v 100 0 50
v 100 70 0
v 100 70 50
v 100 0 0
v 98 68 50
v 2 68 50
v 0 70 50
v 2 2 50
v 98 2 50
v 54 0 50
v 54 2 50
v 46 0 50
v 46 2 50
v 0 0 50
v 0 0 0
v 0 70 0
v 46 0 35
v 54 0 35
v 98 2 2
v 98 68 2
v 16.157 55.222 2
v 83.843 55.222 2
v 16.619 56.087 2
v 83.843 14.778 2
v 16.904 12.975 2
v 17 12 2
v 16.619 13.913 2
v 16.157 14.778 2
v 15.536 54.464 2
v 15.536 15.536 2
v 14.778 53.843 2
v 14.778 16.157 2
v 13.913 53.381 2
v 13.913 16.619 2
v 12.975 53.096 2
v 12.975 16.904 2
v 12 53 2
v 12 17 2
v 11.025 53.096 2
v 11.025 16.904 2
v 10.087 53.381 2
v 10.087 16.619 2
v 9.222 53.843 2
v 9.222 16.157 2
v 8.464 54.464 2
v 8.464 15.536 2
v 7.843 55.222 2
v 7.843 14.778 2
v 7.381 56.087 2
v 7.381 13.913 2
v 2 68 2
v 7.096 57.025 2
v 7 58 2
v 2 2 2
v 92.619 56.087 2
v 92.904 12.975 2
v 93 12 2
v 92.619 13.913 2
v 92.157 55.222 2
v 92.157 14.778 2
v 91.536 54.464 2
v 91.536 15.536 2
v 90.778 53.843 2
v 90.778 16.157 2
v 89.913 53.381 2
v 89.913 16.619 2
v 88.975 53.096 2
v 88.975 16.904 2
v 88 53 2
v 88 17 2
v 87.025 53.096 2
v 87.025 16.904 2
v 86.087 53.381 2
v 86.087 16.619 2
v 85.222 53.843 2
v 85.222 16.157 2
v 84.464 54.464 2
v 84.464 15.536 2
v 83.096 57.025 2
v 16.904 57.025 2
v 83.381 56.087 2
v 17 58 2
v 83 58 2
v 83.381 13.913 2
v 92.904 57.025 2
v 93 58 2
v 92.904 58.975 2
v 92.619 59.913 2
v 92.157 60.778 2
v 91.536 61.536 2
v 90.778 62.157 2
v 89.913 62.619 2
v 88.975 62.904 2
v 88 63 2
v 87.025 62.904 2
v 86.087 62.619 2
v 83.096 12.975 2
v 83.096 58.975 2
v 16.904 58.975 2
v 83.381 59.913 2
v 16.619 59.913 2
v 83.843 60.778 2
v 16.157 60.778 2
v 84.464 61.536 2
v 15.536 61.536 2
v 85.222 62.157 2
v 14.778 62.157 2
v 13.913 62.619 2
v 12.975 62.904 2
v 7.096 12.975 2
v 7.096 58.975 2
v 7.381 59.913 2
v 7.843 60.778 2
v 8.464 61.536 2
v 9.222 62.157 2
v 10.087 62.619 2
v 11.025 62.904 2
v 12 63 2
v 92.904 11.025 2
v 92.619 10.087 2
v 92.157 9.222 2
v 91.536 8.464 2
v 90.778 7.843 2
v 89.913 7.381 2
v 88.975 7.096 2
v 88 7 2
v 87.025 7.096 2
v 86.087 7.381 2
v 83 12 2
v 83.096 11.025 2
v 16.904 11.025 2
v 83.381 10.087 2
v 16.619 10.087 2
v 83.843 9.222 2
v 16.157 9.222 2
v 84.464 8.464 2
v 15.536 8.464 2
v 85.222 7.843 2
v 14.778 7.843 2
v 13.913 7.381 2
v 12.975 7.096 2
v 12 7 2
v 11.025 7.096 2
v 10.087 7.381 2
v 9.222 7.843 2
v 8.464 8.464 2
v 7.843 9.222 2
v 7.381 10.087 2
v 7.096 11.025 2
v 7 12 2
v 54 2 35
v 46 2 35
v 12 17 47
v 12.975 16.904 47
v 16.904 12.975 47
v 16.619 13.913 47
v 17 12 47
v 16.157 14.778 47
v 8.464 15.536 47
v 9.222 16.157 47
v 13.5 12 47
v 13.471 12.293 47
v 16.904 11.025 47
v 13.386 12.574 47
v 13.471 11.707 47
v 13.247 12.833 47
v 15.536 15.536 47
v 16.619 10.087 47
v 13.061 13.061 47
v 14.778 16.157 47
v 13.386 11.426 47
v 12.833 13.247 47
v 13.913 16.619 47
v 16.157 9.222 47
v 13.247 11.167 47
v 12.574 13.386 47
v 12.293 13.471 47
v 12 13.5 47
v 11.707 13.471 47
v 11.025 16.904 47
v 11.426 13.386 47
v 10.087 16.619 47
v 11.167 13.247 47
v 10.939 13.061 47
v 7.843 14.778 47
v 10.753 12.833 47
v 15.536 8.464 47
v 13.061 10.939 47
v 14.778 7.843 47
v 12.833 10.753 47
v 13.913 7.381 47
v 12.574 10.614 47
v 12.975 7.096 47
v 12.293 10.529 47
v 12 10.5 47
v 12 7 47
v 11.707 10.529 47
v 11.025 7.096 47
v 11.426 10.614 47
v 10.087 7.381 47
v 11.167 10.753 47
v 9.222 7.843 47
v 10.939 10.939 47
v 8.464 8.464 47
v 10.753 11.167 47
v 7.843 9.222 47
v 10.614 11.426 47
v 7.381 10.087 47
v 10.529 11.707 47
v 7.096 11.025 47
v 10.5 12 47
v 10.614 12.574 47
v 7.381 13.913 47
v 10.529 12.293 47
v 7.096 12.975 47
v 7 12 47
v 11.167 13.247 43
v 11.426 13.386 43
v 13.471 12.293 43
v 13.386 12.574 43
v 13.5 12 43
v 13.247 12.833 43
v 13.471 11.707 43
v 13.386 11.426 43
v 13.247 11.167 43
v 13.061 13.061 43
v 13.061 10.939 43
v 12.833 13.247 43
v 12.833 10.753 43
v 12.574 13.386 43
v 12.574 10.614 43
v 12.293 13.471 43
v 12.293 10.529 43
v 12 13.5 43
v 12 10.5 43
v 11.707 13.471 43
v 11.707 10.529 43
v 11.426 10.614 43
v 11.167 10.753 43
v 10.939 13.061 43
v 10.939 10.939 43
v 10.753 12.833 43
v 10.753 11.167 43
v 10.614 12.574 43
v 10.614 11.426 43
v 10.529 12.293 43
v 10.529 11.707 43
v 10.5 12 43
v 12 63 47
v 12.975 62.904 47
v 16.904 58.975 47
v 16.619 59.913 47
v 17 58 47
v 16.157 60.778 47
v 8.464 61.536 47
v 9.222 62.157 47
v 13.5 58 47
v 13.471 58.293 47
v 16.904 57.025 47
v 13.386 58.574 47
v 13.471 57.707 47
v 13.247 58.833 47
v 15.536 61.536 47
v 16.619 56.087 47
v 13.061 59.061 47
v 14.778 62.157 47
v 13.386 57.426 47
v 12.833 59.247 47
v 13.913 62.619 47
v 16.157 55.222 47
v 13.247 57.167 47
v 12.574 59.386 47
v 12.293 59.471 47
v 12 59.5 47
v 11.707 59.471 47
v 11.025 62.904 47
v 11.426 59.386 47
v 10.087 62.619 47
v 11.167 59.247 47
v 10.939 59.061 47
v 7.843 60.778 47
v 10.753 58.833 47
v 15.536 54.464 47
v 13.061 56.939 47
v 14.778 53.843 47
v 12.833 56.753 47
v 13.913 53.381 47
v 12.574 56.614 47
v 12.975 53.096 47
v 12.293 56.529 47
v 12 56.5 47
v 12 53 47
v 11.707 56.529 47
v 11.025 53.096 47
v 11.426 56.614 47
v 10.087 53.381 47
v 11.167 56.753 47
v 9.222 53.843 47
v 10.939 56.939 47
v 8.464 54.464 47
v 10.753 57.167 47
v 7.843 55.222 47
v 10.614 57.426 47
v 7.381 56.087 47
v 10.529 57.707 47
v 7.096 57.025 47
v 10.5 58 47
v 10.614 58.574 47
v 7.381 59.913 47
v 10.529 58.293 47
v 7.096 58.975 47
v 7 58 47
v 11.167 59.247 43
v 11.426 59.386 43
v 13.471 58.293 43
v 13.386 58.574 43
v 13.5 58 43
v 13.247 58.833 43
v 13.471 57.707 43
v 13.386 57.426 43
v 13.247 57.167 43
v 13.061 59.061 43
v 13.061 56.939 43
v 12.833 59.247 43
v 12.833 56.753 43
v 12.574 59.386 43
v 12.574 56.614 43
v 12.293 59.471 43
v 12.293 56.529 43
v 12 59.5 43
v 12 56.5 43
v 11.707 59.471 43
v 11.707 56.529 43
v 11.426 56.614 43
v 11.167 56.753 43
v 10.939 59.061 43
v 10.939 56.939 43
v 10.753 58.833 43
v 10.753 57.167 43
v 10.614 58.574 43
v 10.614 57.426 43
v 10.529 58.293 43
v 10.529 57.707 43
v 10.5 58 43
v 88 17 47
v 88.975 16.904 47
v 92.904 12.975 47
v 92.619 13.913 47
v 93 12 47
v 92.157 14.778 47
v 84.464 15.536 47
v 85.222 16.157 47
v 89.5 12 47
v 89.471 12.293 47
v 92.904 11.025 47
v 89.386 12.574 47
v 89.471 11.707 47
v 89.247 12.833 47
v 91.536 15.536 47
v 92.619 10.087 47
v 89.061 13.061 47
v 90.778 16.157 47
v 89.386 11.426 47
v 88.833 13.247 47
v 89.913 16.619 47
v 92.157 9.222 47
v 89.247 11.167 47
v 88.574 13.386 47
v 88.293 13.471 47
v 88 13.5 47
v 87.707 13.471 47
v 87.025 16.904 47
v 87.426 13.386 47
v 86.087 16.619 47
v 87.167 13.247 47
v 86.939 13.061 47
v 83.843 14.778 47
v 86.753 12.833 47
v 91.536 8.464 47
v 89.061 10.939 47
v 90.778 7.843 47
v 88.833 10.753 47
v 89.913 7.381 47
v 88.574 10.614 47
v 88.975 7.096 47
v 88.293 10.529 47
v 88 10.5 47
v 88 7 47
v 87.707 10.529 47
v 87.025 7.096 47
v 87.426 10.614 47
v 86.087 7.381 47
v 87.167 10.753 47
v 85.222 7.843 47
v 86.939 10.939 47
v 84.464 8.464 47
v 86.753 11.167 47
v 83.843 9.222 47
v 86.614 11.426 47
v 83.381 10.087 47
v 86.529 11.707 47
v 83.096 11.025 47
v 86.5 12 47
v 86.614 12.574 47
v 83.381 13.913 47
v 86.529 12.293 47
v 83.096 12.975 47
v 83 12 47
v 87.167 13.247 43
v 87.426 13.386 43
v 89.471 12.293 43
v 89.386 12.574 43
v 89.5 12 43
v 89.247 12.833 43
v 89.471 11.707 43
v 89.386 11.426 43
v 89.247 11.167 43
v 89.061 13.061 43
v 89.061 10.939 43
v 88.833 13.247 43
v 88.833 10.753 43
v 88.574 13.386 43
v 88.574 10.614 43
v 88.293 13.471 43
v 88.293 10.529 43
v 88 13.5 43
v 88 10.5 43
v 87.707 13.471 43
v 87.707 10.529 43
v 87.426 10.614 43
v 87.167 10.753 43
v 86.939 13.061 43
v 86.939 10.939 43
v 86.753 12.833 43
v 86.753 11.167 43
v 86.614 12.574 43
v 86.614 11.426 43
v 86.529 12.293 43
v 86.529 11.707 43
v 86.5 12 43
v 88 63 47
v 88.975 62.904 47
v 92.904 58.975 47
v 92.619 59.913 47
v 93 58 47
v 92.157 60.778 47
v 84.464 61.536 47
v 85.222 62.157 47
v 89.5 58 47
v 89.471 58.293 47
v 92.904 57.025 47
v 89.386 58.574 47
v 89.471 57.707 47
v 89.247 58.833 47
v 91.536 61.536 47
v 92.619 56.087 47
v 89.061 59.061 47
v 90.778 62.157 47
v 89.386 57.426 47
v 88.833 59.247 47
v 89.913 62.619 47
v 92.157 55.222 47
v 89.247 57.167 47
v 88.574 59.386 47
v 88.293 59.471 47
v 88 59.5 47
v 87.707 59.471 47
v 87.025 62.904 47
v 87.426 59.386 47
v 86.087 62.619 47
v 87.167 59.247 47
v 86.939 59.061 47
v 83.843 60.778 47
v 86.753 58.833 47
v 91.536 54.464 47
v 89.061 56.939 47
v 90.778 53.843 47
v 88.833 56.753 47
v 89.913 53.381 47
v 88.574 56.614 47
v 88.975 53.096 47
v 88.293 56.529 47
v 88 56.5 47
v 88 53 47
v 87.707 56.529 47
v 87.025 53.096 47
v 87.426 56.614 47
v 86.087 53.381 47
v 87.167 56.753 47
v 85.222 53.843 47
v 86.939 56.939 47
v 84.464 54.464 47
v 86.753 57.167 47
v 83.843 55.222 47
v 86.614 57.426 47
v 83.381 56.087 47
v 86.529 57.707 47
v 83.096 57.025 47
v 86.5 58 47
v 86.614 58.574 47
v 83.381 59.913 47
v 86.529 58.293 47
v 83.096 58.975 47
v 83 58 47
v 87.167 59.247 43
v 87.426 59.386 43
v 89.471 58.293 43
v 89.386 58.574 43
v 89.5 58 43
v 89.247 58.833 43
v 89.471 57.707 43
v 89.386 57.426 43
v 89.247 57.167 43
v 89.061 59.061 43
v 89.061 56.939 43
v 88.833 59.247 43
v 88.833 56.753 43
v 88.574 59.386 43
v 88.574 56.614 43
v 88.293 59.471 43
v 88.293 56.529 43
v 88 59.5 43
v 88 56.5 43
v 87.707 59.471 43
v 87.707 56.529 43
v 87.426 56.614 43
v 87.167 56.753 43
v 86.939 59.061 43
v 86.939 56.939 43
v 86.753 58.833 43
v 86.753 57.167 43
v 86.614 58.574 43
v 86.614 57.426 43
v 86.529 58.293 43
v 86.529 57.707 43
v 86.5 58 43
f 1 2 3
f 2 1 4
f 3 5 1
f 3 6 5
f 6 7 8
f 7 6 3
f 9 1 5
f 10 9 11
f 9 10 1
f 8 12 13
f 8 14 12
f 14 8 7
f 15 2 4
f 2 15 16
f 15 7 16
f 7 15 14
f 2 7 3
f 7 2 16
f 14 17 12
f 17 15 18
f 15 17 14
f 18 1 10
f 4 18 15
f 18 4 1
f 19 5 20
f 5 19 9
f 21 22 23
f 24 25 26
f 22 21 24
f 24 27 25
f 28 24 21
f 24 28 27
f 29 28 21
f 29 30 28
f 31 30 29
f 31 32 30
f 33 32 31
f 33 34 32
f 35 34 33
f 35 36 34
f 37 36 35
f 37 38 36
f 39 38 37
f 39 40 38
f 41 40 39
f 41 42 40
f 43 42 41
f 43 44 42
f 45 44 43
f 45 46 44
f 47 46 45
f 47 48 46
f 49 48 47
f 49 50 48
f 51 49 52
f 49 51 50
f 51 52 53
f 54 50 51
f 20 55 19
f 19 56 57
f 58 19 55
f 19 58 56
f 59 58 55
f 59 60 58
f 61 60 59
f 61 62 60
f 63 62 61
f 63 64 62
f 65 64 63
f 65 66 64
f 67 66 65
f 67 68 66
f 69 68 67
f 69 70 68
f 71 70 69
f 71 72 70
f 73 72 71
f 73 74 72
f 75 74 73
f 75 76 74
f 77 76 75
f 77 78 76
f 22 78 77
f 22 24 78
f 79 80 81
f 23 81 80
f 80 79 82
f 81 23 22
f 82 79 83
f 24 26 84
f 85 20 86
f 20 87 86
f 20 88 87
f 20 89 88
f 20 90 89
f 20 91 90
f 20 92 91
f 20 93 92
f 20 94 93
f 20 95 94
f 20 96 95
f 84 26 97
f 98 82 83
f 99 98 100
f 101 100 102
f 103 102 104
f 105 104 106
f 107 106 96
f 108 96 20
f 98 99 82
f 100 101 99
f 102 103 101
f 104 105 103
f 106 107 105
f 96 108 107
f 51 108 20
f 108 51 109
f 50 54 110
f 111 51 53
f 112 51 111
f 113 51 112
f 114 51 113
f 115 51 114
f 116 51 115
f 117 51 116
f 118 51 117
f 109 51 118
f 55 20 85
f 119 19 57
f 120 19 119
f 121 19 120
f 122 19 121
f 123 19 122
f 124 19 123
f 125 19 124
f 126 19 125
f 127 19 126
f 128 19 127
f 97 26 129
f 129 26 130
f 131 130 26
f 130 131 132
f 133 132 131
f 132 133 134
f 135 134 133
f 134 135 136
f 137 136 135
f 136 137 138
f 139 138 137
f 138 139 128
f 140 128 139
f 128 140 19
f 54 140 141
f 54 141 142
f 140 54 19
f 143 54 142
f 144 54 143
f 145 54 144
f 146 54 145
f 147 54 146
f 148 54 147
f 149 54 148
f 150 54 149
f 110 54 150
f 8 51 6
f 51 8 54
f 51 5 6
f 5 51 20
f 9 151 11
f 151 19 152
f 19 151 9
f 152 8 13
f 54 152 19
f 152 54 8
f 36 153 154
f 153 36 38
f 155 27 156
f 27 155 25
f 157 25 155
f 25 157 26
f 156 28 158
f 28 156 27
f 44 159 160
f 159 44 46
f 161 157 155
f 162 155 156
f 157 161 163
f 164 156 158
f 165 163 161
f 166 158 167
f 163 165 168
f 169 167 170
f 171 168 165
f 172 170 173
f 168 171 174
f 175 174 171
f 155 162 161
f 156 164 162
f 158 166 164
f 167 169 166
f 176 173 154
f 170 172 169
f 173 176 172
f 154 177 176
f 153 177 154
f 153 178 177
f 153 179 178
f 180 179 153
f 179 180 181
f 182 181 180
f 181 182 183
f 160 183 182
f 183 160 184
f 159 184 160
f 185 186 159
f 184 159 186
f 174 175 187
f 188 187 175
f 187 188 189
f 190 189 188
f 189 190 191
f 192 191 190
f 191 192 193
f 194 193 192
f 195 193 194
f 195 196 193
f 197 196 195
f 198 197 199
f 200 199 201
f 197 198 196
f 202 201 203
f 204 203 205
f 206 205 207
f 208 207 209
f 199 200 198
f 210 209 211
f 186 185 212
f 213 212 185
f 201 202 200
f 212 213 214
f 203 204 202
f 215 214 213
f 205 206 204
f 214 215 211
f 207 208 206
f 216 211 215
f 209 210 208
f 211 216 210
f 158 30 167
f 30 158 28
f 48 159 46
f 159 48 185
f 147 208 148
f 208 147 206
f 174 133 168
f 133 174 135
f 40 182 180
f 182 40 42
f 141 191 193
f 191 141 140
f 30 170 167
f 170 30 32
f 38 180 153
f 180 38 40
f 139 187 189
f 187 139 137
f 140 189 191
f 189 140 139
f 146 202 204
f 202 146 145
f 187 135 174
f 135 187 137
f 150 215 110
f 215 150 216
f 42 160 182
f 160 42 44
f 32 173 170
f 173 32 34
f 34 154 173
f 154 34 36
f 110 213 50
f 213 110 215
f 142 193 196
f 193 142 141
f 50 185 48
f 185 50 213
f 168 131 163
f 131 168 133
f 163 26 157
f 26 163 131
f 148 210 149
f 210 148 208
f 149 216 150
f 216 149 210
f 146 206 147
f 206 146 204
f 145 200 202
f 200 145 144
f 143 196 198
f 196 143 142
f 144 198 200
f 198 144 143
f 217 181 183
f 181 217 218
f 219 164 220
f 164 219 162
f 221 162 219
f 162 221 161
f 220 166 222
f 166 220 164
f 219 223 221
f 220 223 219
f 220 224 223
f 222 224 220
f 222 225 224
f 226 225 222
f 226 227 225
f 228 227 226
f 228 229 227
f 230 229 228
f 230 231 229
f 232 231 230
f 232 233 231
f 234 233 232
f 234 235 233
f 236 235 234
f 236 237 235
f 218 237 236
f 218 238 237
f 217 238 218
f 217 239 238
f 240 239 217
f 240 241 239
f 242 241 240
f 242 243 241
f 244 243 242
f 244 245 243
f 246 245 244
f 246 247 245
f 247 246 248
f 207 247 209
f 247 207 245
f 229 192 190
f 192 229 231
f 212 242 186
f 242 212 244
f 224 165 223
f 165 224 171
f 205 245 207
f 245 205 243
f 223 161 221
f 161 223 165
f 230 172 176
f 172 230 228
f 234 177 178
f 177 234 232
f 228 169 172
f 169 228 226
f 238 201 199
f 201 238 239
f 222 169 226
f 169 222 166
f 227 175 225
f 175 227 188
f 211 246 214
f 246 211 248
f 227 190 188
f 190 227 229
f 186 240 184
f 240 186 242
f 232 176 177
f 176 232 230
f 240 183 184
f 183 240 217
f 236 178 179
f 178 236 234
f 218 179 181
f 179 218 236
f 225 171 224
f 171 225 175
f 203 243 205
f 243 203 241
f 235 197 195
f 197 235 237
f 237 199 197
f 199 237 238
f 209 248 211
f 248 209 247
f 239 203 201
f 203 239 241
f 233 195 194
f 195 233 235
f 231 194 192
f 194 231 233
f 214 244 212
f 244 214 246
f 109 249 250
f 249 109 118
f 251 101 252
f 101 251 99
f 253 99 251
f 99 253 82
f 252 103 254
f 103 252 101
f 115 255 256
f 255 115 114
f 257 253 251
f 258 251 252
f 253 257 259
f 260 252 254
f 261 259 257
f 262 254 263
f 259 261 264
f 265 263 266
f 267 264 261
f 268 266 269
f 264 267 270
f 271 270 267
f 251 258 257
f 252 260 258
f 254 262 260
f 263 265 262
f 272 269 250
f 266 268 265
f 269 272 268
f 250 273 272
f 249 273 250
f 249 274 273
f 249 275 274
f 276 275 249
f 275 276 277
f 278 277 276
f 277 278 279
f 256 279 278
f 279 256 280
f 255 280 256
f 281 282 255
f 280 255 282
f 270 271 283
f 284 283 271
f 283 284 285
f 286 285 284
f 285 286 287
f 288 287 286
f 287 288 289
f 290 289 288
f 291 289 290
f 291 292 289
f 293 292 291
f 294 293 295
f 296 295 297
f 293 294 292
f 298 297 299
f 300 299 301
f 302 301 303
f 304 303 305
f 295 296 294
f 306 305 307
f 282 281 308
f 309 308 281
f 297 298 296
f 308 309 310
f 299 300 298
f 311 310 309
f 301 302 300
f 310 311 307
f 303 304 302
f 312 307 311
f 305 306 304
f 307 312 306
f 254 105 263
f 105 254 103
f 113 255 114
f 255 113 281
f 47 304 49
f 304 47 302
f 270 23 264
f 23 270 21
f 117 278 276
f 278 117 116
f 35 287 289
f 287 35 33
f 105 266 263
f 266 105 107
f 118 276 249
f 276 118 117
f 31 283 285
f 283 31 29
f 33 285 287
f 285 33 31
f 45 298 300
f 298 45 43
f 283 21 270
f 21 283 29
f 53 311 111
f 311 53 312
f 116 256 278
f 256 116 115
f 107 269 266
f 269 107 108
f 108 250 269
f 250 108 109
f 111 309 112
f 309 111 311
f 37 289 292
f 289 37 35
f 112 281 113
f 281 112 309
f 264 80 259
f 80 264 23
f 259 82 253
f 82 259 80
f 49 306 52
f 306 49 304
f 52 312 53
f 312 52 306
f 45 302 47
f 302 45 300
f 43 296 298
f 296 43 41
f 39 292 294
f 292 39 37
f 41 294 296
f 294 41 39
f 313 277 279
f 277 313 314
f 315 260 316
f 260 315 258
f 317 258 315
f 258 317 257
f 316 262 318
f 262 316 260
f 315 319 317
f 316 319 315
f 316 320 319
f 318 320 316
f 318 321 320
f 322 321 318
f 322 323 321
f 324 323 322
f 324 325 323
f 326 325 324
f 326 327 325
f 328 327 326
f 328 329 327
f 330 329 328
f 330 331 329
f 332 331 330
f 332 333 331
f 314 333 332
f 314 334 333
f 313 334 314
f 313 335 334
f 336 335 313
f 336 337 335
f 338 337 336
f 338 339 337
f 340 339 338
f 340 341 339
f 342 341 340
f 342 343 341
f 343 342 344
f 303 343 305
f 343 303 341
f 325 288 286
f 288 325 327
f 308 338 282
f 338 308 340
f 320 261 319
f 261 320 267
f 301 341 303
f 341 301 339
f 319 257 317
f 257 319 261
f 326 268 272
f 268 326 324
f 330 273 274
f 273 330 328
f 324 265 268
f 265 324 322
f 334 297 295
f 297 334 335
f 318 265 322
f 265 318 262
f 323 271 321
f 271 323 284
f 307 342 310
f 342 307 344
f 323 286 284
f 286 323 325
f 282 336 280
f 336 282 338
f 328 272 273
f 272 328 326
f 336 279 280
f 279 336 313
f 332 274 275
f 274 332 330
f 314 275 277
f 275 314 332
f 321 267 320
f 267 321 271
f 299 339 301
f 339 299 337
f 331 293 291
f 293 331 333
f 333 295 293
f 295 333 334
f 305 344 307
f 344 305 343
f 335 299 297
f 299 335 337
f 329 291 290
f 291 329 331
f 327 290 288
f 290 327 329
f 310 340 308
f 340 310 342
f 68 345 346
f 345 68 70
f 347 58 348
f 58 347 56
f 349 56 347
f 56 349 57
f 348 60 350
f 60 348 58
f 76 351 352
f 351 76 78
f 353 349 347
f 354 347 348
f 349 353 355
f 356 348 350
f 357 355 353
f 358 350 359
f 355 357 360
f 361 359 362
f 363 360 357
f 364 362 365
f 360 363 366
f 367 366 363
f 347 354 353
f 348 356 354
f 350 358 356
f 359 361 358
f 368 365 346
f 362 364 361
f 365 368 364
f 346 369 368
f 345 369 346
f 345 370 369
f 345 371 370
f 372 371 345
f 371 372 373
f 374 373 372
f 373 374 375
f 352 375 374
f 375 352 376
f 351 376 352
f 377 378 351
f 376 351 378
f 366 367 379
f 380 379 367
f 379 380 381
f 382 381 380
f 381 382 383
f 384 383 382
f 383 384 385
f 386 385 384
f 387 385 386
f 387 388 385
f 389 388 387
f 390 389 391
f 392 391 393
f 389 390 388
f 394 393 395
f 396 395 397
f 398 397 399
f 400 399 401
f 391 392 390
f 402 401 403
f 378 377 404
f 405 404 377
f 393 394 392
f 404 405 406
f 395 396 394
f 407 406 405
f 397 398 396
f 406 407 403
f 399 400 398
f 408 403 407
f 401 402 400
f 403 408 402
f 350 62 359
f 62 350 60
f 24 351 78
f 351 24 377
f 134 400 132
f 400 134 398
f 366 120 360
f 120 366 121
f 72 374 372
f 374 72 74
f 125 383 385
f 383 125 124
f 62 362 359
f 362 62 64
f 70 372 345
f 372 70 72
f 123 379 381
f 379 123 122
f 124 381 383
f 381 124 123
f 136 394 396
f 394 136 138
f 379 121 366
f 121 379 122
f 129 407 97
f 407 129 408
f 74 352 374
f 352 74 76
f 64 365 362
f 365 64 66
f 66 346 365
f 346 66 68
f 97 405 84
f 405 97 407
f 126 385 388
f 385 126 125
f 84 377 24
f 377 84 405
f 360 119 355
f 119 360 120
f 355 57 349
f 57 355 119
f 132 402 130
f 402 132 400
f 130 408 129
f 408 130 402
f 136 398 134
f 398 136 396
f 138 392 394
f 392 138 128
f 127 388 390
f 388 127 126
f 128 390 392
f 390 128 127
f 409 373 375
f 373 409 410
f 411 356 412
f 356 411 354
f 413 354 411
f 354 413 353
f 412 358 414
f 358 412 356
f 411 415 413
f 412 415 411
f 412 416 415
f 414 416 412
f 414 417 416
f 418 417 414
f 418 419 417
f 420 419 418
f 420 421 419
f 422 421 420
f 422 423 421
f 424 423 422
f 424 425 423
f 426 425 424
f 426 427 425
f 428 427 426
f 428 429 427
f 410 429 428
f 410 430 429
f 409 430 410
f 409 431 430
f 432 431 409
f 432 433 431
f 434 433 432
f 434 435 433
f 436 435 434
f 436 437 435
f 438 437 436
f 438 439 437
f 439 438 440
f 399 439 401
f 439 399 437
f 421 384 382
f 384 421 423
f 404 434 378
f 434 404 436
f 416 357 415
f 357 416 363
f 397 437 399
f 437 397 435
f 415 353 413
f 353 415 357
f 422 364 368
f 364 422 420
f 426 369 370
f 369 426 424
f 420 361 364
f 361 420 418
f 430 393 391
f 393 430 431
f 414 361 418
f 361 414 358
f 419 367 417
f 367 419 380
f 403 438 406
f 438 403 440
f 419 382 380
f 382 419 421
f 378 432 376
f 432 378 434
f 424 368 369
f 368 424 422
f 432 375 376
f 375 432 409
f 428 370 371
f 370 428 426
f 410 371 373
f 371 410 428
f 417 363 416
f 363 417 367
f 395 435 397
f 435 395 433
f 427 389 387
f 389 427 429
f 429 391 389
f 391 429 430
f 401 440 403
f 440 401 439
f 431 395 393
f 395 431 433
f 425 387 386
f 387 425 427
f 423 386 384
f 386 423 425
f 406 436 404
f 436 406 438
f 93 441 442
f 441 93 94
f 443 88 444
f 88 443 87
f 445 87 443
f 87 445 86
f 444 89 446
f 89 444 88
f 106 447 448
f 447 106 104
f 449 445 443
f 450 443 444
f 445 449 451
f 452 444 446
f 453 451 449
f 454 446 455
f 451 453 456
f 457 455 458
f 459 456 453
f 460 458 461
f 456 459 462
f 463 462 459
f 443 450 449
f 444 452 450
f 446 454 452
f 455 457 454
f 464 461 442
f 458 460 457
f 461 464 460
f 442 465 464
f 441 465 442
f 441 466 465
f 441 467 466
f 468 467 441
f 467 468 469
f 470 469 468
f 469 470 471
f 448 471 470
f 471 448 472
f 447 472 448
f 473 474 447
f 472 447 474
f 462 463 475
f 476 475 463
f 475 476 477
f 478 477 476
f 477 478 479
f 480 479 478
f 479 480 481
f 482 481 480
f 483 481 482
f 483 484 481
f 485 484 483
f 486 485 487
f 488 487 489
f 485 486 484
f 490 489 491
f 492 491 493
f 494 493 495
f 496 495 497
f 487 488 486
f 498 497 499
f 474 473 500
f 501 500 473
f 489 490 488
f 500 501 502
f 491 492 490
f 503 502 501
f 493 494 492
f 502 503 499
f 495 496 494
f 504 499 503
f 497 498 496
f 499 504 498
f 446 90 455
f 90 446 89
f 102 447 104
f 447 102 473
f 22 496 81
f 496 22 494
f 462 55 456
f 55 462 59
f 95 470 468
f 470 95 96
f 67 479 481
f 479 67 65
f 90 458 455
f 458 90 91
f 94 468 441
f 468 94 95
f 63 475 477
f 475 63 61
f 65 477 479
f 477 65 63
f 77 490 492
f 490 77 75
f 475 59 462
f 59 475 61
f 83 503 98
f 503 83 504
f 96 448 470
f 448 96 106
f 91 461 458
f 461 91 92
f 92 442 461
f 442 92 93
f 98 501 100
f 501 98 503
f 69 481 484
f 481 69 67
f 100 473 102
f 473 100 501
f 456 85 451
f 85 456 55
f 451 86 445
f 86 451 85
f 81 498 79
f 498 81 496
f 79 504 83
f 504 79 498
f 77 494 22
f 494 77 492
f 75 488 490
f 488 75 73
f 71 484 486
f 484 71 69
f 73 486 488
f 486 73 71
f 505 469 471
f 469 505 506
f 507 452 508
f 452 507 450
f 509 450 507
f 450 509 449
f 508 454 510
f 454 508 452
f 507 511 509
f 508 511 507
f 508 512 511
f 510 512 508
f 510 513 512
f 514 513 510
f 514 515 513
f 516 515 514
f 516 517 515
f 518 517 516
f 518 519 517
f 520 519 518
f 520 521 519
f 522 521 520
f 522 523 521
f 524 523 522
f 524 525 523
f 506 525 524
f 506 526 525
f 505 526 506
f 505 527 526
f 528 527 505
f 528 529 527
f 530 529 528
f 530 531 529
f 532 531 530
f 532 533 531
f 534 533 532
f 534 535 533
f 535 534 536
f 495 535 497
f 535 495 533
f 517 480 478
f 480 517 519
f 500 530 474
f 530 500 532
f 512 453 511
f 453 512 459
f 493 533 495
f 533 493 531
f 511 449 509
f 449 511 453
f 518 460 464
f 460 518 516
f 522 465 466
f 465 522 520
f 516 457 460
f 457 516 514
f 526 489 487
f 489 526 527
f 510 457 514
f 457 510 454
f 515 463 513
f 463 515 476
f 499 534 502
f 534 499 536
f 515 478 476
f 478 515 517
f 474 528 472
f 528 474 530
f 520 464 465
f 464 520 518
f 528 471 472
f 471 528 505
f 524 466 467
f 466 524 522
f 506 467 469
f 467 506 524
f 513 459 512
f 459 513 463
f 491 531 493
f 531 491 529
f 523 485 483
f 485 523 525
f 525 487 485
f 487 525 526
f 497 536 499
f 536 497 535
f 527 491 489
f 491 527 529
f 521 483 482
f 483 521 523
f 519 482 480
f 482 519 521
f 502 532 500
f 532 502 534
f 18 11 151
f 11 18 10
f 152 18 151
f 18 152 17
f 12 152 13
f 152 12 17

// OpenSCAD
$fn = 32;

// ----------------------------------------------------------------------
// Enclosure box: both enclosure
// ----------------------------------------------------------------------

// --- parameters (mm) ---
box_l = 100;              // outer length, X
box_w = 70;               // outer width, Y
box_h = 50;               // outer height
wall_t = 2;               // wall thickness
boss_r = 5;               // corner boss radius
hole_r = 1.5;             // boss screw hole radius
boss_in = 12;             // boss inset from the corners
notch_w = 8;              // cable notch width
notch_h = 15;             // cable notch height

inner_h = box_h - wall_t;  // cavity depth
boss_h = inner_h - 2;  // corner boss height

difference() {
  union() {
    difference() {
      cube([box_l, box_w, box_h]);
      translate([wall_t, wall_t, wall_t])
        cube([box_l - 2 * wall_t, box_w - 2 * wall_t, box_h]);
    }
    for (sx = [0, 1], sy = [0, 1])
      translate([sx ? box_l - boss_in : boss_in,
                 sy ? box_w - boss_in : boss_in, wall_t - 1])
        difference() {
          cylinder(r = boss_r, h = boss_h);
          translate([0, 0, boss_h - 4])
            cylinder(r = hole_r, h = 5);
        }
  }
  translate([box_l / 2 - notch_w / 2, -1, box_h - notch_h])
    cube([notch_w, wall_t + 2, notch_h + 1]);
}
